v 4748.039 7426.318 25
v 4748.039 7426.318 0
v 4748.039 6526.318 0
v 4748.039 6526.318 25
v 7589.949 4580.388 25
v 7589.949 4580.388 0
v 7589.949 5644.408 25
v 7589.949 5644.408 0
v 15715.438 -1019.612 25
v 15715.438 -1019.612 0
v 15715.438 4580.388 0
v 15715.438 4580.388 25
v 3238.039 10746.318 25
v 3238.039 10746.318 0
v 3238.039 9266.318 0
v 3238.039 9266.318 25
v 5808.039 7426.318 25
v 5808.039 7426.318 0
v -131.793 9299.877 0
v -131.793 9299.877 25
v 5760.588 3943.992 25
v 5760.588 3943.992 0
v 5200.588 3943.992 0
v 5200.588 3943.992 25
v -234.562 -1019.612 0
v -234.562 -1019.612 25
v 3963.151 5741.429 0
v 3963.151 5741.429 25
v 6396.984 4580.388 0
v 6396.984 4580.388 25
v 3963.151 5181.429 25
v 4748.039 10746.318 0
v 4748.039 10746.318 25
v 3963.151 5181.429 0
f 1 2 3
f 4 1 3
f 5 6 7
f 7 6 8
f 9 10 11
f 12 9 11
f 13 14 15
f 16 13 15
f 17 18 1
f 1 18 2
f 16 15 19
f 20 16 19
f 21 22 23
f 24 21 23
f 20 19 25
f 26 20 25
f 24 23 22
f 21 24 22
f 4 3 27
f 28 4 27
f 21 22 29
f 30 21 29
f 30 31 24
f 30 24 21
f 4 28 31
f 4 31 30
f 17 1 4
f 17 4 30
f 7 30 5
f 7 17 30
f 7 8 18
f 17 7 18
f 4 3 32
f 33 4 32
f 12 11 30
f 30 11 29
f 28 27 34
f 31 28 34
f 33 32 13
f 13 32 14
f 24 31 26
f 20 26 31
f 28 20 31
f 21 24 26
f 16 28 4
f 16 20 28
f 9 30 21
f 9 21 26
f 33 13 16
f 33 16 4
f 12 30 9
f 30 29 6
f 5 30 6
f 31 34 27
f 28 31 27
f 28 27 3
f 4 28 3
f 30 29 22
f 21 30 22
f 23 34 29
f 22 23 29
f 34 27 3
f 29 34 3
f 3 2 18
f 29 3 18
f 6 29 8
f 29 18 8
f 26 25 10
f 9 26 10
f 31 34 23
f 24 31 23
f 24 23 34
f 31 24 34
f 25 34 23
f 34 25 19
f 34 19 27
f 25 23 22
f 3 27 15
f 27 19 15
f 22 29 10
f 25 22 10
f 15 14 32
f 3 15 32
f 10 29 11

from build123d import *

# Parameters (mm, degrees)
F1_DEPTH = 25
F2_DEPTH = 25


# Not quite as in the source:
# - the program builds the solid bodies; features that only make, move or delete a surface that nothing else refers to are left out


with BuildPart() as f1:
    # F3 (on Top) → F1 (new body)
    with BuildSketch(Plane.XY):
        Polygon((-131.7934449173, 9299.8765415886), (-234.5616734816, -1019.6117544074), (15715.4383265184, -1019.6117544074), (15715.4383265184, 4580.3882455926), (7589.948546532, 4580.3882455926), (6396.9839009692, 4580.3882455926), (5760.5877979013, 3943.9921425247), (5200.5877979013, 3943.9921425247), (3963.1509308248, 5181.4290096012), (3963.1509308248, 5741.4290096012), (4748.0394579419, 6526.3175367182), (4748.0394579419, 7426.3175367182), (4748.0394579419, 10746.3175367182), (3238.0394579419, 10746.3175367182), (3238.0394579419, 9266.3175367182), align=None)
    extrude(amount=F1_DEPTH)


with BuildPart() as f2:
    # F3 (on Top) → F2 (new body)
    with BuildSketch(Plane.XY):
        Polygon((6396.9839009692, 4580.3882455926), (7589.948546532, 4580.3882455926), (7589.948546532, 5644.4084481281), (5808.0394579419, 7426.3175367182), (4748.0394579419, 7426.3175367182), (4748.0394579419, 6526.3175367182), (3963.1509308248, 5741.4290096012), (3963.1509308248, 5181.4290096012), (5200.5877979013, 3943.9921425247), (5760.5877979013, 3943.9921425247), align=None)
    extrude(amount=F2_DEPTH)


solid = Compound([f1.part, f2.part])
